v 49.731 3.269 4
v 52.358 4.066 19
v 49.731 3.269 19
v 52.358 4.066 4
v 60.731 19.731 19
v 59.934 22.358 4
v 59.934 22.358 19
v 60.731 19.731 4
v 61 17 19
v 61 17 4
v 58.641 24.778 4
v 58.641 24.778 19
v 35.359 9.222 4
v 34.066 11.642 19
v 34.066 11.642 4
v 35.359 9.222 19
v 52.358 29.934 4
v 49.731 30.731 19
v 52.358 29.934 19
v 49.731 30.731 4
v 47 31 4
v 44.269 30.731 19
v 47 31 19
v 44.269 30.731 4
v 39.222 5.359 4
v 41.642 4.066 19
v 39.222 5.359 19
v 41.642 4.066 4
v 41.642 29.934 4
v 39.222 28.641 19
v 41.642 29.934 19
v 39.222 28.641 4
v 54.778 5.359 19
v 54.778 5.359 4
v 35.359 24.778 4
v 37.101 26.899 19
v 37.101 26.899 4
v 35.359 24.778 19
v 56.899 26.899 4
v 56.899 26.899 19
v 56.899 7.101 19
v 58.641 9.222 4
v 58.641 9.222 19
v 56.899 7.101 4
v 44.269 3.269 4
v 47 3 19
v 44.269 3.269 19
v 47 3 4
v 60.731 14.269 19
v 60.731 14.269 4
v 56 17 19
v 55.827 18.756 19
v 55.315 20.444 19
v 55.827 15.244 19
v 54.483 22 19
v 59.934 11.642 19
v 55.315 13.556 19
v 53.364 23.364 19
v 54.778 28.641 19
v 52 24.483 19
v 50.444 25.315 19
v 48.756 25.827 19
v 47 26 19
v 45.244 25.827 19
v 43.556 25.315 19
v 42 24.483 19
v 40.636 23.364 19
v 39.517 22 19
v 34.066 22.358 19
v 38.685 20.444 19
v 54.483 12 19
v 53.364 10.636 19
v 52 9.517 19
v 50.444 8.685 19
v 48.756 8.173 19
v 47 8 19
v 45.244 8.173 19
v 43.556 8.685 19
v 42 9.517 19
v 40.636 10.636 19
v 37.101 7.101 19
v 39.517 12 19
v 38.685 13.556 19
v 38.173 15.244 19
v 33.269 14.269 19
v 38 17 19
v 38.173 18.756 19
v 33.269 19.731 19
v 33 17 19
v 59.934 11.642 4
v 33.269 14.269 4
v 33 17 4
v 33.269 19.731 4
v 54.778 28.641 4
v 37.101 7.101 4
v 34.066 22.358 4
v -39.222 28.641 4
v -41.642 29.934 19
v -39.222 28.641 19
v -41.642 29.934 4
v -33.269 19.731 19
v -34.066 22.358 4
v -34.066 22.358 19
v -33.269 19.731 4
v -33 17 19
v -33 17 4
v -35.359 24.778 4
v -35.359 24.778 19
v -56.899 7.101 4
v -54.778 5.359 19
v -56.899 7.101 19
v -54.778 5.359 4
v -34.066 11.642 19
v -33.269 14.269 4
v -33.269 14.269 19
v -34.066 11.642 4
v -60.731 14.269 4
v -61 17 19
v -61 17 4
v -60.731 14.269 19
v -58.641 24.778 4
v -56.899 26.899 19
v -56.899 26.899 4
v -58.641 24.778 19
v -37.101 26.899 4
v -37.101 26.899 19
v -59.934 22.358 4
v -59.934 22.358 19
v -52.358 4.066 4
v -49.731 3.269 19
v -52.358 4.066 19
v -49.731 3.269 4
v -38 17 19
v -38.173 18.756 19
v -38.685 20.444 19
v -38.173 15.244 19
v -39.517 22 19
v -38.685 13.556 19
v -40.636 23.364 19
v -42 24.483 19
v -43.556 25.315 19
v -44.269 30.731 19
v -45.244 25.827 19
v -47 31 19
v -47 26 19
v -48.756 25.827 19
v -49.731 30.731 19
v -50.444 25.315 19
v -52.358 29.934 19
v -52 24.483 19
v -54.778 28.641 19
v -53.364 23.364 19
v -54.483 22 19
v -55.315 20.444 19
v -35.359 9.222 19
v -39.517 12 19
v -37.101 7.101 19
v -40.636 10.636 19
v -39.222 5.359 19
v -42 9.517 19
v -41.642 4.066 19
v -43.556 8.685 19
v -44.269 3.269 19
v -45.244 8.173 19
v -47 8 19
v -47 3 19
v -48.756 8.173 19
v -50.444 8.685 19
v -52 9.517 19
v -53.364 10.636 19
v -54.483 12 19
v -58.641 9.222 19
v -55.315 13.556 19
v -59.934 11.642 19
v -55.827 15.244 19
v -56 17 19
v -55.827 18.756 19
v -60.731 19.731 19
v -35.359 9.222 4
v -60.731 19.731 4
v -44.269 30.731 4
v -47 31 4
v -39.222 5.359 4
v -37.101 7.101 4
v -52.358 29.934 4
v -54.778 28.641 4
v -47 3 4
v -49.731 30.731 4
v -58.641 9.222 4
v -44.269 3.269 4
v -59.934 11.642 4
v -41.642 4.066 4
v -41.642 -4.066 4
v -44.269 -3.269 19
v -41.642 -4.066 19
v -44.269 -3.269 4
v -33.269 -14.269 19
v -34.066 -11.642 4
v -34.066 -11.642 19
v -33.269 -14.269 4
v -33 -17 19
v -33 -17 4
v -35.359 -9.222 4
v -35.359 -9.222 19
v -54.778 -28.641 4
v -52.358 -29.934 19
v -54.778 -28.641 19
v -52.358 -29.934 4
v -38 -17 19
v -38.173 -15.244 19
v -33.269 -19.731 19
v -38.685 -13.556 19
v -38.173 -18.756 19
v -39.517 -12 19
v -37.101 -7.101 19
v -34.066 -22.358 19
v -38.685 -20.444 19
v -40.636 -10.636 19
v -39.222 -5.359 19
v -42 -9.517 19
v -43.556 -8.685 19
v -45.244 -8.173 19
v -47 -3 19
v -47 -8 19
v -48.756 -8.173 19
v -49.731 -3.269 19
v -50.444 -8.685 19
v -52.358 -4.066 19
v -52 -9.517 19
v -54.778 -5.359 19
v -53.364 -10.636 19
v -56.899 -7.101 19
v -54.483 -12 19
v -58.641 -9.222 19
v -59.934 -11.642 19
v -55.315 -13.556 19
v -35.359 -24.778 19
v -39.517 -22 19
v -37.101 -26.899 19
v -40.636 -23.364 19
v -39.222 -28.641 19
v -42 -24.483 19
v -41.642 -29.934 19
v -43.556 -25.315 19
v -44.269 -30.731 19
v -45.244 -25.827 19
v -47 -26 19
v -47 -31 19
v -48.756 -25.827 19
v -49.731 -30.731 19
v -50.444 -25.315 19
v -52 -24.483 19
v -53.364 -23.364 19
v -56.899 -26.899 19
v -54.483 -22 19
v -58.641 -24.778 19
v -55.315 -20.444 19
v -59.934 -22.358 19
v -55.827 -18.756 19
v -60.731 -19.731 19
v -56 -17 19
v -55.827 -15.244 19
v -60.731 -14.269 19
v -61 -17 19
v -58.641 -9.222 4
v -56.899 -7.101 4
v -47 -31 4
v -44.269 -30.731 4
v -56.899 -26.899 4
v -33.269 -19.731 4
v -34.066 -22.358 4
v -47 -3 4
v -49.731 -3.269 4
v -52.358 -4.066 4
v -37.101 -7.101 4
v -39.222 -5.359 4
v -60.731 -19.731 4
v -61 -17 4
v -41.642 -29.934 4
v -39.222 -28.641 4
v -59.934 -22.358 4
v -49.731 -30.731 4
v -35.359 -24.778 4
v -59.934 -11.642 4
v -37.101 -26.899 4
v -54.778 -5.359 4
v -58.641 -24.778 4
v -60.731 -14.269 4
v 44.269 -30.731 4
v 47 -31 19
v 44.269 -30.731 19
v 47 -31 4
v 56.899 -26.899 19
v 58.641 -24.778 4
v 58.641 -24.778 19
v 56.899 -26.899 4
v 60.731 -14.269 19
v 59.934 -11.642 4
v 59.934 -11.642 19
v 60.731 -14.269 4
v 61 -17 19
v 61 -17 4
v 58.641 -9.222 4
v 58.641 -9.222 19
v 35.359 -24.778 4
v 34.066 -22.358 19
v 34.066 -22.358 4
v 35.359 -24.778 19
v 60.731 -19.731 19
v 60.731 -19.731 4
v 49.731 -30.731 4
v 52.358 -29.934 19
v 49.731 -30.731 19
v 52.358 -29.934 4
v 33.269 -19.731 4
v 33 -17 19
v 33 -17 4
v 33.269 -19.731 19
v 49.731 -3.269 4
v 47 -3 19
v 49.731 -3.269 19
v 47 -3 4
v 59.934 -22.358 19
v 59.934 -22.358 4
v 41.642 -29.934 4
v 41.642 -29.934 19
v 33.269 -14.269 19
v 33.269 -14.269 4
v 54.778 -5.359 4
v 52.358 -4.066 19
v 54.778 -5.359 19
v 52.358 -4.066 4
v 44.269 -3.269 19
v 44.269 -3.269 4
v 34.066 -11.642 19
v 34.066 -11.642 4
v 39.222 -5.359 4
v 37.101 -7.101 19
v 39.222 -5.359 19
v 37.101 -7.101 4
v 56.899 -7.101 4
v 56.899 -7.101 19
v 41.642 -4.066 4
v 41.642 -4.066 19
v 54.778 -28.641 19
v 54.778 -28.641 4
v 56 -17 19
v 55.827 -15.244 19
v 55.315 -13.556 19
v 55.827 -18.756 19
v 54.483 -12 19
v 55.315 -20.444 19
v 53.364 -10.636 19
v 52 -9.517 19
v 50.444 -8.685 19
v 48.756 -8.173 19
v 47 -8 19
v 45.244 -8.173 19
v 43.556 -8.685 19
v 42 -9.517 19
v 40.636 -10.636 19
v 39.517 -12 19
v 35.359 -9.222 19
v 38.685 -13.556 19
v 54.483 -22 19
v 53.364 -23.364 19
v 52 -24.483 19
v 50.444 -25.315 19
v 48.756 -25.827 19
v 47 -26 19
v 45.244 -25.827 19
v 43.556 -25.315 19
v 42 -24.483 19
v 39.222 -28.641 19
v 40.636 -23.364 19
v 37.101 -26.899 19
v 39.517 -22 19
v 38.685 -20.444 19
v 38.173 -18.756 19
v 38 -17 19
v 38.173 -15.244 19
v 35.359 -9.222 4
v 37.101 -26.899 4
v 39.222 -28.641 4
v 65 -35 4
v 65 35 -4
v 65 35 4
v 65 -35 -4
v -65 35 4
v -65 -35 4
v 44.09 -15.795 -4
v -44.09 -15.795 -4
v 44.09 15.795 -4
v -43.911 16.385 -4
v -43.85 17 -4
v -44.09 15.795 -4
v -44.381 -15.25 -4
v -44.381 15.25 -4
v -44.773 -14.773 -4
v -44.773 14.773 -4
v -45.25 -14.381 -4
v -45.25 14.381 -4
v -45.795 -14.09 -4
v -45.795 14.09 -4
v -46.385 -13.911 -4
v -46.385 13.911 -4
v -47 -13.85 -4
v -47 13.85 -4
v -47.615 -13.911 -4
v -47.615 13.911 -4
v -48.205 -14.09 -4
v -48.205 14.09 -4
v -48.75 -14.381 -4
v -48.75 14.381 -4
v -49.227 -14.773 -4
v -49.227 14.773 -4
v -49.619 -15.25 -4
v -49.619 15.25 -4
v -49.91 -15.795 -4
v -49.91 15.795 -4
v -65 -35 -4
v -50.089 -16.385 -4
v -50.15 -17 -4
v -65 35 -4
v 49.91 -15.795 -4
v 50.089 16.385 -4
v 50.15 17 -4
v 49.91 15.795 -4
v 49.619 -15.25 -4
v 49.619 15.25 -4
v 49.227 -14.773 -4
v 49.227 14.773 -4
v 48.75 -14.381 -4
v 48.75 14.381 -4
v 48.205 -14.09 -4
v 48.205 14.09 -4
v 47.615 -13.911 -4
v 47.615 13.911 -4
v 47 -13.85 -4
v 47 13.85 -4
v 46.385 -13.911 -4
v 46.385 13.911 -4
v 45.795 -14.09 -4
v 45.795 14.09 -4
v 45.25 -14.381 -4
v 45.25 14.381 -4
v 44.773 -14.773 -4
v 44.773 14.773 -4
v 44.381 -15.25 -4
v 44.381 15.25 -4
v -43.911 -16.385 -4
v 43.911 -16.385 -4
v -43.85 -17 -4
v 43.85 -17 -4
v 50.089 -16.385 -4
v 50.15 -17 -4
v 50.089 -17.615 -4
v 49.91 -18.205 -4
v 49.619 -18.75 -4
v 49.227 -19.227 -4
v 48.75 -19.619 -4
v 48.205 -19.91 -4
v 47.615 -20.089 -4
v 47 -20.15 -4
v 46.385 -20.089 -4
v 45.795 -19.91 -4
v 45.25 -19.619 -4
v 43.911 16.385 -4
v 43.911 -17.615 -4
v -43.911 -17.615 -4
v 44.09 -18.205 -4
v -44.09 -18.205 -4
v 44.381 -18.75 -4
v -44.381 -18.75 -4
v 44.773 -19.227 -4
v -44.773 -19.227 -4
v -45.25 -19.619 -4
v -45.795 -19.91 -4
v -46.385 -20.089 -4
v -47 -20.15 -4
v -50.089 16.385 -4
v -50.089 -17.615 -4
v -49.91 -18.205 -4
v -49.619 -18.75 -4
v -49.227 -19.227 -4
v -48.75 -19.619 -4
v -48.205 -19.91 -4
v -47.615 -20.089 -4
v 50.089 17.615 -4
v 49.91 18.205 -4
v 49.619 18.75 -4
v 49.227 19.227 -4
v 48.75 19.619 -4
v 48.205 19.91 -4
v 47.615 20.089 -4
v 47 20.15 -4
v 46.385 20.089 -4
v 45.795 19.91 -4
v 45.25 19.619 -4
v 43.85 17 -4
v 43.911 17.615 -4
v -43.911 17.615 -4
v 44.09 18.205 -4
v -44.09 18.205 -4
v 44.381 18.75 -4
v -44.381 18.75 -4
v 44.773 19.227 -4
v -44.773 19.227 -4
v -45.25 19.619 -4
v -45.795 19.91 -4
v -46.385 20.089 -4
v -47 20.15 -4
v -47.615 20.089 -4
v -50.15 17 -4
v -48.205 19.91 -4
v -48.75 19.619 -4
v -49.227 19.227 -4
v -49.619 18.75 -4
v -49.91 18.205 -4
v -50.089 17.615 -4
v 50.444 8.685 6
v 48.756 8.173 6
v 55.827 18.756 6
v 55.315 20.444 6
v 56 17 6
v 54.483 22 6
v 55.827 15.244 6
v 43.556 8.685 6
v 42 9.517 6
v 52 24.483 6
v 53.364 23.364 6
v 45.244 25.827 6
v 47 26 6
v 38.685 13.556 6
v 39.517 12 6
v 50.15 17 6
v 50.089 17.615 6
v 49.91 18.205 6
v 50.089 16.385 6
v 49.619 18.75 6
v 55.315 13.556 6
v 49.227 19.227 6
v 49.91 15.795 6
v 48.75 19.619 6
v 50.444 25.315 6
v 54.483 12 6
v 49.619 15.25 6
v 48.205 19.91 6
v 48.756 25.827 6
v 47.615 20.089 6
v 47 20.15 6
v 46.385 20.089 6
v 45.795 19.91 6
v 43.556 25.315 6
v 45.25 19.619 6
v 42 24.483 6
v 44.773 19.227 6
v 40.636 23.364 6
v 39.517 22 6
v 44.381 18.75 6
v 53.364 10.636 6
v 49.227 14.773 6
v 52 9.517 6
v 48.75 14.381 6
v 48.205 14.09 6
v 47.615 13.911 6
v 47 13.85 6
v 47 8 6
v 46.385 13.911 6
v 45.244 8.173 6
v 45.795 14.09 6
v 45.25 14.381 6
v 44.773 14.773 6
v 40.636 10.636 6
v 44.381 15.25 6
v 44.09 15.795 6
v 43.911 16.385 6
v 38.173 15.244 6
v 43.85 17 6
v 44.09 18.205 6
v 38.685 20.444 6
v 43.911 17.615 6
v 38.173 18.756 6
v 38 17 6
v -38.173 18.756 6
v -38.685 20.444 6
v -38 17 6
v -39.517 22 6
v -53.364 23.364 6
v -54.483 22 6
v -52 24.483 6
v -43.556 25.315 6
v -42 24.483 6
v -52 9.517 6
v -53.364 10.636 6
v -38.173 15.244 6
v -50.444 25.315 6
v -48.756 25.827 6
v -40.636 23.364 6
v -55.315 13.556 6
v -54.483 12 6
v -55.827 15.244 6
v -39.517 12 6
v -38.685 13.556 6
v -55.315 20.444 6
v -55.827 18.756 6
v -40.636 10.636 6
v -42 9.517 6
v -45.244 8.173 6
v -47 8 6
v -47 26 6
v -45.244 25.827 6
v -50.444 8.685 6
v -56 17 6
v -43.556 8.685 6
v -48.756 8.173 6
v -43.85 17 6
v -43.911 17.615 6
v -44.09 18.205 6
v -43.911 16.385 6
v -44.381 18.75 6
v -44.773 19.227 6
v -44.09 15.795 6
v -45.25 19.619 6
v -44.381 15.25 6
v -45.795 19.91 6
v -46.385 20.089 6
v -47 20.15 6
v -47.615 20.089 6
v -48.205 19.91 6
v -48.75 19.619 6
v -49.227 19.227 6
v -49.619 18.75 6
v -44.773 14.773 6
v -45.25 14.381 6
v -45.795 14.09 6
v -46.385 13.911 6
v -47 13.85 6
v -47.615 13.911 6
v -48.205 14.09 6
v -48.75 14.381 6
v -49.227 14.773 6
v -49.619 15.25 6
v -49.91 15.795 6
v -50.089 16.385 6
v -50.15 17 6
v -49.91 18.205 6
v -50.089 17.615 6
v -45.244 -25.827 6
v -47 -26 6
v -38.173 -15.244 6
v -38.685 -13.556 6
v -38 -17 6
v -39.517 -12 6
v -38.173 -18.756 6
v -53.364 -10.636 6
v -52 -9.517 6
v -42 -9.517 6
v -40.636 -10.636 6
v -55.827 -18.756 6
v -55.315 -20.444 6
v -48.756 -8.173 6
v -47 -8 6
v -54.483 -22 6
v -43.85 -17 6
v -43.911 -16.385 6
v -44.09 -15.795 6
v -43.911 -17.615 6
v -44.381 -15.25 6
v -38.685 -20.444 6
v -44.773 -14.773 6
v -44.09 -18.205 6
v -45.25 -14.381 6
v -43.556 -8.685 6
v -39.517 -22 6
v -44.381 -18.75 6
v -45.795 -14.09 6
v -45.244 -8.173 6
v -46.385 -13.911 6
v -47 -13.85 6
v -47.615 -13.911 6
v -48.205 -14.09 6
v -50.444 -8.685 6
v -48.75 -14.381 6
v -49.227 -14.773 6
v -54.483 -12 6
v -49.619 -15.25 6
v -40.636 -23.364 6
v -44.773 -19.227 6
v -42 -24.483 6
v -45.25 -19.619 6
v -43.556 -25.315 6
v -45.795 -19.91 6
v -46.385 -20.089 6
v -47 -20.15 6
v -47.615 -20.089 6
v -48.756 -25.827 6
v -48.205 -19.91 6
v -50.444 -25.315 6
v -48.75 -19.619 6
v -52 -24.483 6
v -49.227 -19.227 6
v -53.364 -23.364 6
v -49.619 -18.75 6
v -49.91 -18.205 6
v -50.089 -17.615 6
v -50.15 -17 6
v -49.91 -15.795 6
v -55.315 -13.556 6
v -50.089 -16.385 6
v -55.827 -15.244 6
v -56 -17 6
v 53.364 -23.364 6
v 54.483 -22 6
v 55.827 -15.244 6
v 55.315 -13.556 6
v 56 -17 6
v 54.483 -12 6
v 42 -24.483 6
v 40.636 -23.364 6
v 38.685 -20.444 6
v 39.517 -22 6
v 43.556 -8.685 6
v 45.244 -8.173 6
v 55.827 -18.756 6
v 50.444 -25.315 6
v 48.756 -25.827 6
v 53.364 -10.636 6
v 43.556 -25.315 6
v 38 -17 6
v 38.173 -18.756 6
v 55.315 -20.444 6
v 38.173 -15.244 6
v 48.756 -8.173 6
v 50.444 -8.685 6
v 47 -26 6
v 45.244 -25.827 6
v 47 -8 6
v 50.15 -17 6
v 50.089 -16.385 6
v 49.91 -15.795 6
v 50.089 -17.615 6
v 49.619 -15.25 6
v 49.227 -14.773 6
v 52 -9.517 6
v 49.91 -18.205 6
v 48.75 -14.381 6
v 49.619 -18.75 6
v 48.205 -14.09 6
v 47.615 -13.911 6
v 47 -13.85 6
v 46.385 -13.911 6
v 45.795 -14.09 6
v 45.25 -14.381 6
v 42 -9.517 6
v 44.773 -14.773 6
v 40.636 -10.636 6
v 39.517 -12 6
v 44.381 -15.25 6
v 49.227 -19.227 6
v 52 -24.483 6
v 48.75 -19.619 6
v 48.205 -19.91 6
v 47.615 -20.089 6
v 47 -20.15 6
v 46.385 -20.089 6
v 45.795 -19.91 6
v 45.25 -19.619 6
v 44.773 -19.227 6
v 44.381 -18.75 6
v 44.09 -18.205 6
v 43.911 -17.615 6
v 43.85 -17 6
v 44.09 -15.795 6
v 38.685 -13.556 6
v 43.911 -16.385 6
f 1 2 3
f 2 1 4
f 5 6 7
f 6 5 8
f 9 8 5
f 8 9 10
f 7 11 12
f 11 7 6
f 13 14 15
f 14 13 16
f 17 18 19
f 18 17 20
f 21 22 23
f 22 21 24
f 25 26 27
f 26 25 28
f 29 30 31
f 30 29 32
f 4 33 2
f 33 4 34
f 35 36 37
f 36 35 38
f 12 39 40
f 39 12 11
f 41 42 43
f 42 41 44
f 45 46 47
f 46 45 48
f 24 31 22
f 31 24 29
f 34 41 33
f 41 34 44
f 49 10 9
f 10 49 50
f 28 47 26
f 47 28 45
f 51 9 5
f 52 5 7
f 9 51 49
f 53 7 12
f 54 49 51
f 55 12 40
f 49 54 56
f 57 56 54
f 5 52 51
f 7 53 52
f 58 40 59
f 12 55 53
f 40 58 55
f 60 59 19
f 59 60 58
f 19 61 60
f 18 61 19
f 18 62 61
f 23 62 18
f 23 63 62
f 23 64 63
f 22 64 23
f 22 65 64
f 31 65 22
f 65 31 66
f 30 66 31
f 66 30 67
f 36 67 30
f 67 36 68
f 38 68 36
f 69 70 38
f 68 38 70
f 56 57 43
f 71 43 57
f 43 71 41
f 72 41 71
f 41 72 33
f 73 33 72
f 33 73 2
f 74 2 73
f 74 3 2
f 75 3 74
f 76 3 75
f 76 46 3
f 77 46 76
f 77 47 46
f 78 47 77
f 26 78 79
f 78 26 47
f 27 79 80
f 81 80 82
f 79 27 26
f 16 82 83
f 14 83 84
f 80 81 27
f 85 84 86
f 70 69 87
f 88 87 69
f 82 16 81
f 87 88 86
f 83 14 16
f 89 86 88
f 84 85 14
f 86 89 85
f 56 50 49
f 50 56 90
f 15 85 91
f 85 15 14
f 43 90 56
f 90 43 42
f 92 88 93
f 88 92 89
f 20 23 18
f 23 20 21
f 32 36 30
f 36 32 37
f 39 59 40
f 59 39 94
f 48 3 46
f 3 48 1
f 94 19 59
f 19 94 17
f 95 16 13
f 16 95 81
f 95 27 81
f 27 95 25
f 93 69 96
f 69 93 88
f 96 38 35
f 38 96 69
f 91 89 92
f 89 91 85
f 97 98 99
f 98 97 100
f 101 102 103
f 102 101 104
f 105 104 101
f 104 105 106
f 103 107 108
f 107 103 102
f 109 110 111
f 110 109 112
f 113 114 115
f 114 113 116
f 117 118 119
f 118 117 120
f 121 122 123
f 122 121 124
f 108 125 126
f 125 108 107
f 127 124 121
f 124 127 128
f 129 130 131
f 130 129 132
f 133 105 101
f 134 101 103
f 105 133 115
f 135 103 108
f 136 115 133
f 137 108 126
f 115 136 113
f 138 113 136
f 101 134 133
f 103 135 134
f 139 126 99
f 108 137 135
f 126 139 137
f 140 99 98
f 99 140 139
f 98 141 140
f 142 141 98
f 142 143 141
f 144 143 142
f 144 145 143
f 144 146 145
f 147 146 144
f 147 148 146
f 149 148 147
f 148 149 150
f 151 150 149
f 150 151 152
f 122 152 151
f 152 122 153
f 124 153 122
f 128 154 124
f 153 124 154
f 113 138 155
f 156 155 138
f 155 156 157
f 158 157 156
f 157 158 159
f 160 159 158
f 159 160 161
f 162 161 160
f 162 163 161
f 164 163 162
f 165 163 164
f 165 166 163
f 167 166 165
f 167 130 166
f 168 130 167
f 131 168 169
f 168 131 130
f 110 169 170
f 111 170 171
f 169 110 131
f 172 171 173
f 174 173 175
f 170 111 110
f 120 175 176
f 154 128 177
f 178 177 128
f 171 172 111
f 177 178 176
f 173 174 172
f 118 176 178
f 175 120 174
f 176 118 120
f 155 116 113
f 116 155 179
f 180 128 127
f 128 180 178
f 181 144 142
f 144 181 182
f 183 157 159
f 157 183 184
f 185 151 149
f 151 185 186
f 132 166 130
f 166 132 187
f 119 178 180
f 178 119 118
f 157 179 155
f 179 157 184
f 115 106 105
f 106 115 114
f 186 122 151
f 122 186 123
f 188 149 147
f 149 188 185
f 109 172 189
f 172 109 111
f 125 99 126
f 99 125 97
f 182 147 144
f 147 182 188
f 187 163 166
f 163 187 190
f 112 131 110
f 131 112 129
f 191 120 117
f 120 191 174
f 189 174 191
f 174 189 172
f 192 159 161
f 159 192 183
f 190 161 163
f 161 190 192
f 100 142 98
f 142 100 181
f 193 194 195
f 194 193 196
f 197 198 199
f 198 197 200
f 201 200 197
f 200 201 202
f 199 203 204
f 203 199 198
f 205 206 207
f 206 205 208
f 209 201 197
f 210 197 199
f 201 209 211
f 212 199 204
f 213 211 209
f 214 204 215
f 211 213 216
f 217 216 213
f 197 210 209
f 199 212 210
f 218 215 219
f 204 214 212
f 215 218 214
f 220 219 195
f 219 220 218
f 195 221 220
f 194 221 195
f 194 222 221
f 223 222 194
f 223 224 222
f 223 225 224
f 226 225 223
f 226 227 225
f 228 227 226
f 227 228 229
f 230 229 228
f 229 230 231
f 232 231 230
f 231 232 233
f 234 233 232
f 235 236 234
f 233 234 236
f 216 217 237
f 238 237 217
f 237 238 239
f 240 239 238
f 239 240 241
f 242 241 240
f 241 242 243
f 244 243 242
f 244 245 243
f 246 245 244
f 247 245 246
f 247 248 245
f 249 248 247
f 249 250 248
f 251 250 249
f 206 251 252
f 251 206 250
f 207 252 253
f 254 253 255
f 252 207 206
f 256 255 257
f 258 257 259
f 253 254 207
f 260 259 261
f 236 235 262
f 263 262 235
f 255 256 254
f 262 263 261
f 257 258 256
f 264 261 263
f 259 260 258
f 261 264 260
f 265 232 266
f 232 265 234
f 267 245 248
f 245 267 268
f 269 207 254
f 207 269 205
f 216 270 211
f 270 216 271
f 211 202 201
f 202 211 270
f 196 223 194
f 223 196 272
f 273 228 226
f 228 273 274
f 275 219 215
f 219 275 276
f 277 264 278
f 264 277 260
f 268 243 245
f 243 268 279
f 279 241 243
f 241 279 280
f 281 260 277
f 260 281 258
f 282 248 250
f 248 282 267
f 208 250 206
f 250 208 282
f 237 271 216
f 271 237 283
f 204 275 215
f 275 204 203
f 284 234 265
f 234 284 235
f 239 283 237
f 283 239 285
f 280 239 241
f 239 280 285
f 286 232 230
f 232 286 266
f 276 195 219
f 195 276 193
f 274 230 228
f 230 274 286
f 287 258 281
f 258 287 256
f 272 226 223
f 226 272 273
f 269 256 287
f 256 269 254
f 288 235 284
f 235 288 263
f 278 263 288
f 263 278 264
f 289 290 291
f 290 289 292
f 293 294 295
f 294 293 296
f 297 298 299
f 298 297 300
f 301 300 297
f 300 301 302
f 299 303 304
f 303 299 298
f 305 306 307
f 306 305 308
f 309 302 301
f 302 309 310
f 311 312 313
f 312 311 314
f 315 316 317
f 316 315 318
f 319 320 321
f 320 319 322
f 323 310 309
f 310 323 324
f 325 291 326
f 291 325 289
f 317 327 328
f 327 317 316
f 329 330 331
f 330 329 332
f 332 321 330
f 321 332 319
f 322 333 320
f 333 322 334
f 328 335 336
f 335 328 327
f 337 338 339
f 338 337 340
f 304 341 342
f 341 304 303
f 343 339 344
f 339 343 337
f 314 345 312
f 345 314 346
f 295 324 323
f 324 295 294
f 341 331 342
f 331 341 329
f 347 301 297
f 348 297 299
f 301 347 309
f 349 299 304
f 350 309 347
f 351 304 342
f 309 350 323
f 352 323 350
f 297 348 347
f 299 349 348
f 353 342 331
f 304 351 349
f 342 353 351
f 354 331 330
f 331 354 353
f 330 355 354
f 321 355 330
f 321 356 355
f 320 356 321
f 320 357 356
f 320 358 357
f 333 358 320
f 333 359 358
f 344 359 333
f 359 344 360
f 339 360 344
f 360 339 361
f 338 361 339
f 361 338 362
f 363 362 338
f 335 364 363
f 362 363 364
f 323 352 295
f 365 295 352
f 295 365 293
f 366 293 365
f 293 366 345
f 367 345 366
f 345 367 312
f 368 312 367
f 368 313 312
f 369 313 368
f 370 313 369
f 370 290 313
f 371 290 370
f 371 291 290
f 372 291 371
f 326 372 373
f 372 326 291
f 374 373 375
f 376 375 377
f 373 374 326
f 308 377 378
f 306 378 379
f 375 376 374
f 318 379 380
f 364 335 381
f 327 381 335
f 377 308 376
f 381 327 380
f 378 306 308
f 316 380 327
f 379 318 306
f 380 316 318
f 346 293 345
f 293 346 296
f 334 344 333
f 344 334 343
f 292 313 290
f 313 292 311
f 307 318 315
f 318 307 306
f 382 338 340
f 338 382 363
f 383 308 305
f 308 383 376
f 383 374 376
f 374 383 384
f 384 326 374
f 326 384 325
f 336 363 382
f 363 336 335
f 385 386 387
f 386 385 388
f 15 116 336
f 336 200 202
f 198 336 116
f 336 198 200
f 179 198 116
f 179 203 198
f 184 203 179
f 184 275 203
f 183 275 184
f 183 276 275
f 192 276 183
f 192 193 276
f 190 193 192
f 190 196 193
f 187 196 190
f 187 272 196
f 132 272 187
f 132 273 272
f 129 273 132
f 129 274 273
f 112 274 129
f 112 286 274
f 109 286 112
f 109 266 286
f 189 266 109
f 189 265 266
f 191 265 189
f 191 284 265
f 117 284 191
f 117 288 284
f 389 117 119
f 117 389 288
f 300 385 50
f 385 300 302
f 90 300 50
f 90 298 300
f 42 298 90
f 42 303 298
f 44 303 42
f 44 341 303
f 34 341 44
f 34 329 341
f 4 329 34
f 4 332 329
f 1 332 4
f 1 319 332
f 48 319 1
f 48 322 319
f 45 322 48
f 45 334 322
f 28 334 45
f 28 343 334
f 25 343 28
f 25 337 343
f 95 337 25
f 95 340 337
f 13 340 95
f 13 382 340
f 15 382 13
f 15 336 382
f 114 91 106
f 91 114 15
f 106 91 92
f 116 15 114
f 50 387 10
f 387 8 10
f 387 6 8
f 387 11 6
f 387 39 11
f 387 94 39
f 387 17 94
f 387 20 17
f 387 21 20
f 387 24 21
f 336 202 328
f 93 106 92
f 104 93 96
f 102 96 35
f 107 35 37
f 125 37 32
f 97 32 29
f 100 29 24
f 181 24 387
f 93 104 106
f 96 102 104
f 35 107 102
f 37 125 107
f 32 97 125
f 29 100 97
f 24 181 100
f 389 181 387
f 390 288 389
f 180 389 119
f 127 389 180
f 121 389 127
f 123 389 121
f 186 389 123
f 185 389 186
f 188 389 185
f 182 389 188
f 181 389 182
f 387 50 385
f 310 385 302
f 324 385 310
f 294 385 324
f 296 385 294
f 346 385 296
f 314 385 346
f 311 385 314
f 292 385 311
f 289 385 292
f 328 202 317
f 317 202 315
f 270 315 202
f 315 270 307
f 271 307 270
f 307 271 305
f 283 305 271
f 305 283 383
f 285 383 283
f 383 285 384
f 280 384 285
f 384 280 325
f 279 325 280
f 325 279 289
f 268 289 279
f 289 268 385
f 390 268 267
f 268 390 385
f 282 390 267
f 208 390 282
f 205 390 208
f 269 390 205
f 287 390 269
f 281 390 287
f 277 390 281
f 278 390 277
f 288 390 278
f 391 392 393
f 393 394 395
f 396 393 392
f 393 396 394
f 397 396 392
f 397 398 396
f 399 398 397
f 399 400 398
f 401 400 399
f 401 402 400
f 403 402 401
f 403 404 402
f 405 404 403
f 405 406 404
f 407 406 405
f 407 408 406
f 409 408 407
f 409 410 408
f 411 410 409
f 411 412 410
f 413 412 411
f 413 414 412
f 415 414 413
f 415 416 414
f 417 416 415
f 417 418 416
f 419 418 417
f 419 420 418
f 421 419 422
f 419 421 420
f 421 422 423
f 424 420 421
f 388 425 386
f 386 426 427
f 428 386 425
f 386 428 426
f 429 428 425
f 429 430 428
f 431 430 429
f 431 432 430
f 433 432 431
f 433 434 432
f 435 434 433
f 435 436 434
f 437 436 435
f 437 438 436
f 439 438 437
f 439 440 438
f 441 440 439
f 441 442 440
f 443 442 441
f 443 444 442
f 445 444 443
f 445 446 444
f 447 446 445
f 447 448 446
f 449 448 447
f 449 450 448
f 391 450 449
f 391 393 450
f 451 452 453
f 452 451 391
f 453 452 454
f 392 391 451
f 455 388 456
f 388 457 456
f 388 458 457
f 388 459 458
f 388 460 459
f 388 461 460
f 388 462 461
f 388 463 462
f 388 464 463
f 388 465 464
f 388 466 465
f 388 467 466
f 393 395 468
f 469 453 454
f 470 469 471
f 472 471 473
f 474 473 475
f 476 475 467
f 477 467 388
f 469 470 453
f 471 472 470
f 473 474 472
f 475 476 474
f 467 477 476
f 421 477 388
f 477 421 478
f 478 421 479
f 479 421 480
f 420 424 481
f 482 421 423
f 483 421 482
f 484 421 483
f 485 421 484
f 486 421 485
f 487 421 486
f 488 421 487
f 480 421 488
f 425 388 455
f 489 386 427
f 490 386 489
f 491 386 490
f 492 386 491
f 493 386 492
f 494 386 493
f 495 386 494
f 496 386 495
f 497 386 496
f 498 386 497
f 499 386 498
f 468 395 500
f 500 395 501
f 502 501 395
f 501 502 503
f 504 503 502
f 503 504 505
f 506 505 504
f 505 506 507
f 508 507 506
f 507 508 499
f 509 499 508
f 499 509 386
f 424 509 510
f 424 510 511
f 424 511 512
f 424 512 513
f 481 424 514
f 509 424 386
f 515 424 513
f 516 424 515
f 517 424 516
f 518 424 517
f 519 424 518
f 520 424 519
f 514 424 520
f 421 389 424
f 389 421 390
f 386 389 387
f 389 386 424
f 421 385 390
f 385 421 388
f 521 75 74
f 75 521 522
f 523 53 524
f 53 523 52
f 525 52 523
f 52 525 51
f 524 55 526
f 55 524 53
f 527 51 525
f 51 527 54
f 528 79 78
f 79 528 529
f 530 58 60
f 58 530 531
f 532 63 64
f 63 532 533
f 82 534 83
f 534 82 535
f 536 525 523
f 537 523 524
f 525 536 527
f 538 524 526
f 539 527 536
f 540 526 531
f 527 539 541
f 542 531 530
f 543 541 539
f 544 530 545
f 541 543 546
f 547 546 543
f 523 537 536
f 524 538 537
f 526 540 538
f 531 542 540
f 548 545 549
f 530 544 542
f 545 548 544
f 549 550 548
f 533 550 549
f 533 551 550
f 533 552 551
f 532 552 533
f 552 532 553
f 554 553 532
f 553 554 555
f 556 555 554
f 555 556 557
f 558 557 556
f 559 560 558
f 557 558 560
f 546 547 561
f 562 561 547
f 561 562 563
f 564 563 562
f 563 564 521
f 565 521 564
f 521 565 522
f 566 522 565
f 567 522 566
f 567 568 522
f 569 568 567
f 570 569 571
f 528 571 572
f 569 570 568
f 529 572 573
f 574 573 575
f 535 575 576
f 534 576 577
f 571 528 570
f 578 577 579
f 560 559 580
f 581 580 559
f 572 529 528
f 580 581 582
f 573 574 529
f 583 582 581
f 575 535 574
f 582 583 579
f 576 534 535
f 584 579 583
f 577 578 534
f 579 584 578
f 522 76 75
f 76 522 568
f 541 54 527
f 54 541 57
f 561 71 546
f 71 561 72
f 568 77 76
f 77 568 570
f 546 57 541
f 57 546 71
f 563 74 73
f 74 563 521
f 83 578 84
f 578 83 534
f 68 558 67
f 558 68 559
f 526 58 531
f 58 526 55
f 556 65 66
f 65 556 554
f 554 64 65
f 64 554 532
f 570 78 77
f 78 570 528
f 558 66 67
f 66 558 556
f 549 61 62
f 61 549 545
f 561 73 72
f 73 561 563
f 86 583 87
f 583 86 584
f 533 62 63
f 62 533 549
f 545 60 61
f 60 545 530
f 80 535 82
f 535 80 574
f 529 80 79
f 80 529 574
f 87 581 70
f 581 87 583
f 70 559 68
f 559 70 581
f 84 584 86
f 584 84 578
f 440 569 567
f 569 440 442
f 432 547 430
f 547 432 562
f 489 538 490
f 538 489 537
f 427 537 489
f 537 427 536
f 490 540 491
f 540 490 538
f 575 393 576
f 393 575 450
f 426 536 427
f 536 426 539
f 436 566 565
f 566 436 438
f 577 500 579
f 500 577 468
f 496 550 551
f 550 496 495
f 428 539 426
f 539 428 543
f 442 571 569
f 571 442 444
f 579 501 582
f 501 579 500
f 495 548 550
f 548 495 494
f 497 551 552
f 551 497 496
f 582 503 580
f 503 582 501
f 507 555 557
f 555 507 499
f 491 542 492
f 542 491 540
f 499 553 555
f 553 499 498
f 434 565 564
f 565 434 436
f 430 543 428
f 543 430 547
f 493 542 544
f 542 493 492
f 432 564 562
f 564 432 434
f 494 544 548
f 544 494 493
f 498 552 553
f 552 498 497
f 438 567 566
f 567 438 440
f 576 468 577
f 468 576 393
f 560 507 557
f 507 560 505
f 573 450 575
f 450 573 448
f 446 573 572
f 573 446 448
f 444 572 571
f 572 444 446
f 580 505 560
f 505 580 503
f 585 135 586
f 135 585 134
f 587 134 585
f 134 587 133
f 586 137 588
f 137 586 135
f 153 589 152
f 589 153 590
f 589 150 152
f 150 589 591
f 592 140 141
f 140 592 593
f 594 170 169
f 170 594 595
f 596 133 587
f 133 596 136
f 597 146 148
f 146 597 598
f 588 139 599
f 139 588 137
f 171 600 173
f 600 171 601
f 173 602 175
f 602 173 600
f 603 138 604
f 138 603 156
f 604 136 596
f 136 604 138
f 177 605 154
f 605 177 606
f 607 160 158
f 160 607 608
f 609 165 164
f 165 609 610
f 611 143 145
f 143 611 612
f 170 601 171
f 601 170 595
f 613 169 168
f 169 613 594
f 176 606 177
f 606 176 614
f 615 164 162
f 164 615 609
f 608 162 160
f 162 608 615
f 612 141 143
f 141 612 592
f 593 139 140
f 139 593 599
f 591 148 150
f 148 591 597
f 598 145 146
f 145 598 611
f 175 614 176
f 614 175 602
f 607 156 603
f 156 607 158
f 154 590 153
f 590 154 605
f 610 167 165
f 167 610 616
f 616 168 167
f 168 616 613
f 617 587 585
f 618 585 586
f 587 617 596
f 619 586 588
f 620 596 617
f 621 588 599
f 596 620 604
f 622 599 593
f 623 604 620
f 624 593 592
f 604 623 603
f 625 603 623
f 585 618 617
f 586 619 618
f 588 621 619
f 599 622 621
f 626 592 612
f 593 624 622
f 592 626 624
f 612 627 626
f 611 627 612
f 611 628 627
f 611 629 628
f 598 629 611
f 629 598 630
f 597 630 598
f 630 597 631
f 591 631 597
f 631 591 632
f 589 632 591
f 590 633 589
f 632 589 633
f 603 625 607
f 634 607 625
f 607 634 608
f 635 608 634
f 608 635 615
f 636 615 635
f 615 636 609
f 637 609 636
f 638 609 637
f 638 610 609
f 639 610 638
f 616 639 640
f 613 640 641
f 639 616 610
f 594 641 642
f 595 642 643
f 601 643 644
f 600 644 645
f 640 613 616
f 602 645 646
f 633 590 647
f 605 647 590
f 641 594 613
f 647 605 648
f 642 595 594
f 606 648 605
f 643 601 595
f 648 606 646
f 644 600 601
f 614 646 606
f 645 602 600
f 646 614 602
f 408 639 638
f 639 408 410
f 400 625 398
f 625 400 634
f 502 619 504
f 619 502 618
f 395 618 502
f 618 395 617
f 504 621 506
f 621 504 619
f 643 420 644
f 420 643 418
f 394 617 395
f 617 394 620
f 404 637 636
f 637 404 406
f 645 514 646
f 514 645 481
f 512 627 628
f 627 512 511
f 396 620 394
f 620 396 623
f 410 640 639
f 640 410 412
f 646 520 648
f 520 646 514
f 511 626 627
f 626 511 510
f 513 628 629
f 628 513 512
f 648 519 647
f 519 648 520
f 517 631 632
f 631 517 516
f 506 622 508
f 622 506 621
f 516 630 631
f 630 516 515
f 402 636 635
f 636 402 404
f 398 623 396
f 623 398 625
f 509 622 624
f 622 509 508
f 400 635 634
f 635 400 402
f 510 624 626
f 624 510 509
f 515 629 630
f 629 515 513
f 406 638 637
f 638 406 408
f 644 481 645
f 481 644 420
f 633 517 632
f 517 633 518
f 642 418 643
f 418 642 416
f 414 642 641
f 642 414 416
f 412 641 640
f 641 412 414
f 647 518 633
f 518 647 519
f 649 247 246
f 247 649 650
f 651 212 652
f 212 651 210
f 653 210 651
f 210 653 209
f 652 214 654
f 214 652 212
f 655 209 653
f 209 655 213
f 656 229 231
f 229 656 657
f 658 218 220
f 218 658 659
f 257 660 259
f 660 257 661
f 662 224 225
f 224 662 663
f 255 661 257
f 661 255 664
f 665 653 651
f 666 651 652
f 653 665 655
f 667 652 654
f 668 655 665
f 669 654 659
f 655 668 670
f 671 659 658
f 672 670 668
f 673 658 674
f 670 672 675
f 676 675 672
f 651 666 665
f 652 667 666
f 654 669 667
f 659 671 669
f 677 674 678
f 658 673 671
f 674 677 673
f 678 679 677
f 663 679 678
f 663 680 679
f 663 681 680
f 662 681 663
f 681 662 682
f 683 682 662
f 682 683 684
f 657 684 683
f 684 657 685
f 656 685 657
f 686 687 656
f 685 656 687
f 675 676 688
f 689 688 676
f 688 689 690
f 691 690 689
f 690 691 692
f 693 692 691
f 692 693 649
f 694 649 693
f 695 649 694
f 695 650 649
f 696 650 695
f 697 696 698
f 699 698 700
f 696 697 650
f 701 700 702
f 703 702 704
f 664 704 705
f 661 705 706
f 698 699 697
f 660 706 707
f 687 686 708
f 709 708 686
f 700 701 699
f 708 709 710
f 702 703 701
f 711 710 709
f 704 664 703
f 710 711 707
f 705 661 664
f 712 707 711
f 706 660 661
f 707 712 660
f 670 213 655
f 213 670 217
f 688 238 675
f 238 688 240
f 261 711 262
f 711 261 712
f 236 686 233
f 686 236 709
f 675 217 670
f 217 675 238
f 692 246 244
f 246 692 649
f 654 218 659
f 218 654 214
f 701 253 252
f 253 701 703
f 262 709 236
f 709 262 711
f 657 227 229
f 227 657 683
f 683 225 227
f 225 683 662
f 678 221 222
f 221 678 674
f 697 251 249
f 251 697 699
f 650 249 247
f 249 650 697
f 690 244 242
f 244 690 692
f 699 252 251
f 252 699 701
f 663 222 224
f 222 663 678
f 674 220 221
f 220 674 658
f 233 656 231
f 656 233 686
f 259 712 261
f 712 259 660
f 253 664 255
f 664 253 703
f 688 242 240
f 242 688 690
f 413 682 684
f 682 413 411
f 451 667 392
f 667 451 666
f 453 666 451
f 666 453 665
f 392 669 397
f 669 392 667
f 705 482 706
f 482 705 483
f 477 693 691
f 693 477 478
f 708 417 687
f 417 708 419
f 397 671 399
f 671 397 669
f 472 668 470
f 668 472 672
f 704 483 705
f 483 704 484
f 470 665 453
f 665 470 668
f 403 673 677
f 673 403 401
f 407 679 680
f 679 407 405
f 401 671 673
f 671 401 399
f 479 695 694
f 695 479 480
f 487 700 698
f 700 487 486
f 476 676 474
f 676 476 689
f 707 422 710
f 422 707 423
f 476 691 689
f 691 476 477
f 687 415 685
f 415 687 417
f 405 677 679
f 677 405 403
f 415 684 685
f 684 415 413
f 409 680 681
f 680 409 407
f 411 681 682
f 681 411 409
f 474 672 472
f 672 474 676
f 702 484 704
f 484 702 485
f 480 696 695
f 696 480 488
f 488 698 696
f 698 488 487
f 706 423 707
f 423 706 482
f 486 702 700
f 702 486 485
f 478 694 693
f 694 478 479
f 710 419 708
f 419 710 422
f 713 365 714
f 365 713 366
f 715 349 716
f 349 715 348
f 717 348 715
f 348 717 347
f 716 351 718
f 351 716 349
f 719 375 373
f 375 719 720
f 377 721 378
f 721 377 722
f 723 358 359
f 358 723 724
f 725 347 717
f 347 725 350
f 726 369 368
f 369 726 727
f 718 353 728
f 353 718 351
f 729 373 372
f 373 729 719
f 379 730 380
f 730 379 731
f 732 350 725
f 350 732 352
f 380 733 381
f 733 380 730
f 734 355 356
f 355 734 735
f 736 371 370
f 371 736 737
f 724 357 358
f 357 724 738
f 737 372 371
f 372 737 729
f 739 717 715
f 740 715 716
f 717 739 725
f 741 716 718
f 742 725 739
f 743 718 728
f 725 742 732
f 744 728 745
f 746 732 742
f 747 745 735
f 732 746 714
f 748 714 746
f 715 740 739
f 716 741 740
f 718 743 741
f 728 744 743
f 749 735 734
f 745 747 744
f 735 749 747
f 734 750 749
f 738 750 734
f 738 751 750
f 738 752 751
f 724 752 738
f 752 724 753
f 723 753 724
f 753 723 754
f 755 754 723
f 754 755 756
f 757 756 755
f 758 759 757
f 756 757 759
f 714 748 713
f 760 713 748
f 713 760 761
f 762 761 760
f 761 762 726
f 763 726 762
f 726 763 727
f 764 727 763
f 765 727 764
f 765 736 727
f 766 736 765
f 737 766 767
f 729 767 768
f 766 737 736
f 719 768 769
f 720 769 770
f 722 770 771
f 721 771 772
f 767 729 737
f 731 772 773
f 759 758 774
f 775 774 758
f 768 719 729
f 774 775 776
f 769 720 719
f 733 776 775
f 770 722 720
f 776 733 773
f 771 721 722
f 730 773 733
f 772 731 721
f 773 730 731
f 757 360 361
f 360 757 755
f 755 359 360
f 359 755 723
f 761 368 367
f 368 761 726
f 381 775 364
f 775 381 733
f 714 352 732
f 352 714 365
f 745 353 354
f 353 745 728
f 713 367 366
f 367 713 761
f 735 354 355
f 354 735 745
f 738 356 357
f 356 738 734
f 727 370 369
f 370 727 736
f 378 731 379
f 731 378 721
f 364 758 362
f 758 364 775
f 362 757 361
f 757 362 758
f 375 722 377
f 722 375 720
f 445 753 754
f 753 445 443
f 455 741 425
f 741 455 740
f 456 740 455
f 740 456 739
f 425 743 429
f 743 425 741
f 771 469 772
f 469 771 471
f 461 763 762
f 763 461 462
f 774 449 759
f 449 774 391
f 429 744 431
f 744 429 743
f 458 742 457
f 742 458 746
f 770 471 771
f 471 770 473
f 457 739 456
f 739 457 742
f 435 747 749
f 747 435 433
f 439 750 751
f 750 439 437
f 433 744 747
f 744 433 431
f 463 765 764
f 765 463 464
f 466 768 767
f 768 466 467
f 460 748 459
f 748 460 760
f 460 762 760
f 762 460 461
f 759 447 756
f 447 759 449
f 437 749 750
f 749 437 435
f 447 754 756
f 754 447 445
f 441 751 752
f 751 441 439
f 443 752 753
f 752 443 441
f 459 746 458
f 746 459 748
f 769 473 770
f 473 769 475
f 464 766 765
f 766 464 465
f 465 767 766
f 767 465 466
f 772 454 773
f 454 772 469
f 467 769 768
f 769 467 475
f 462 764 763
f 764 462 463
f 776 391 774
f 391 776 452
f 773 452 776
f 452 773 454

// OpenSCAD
$fn = 32;

// ----------------------------------------------------------------------
// Socket pad plate
// bosses with counterbored sockets for the screws
// ----------------------------------------------------------------------

// --- parameters (mm) ---
base_t = 8;            // base plate thickness
boss_h = 15;           // boss height above the base plate
boss_d = 28;           // boss diameter
socket_d = 18;         // socket diameter
socket_depth = 13;     // socket depth from the boss face
bolt_d = 6.3;          // screw clearance hole through the socket floor
plate = [130, 70, 8];  // overall size (x, y, z)
edge = 18;             // boss centre offset from the plate edge
pads = 4;              // boss count, one per corner

// --- derived feature positions (mm) ---
height = base_t + boss_h;        // = 23   overall height of the part
corner_x = plate[0] / 2 - edge;  // = 47   boss centre X
corner_y = plate[1] / 2 - edge;  // = 17   boss centre Y
feature_centers = [
  [corner_x, corner_y],
  [-corner_x, corner_y],
  [-corner_x, -corner_y],
  [corner_x, -corner_y]
];   // boss centres: sockets, holes and the pads themselves are placed from here

// base plate, bosses on feature_centers, socket + through hole in each
difference() {
  union() {
    cube(plate, center = true);
    for (centre = feature_centers)
      translate([centre[0], centre[1], plate[2] / 2 - 1])
        cylinder(d = boss_d, h = boss_h + 1);
  }
  for (centre = feature_centers) {
    translate([centre[0], centre[1], plate[2] / 2 + boss_h - socket_depth])
      cylinder(d = socket_d, h = socket_depth + 1);
    translate([centre[0], centre[1], -height])
      cylinder(d = bolt_d, h = 2 * height + 2);  // through the socket floor
  }
}
